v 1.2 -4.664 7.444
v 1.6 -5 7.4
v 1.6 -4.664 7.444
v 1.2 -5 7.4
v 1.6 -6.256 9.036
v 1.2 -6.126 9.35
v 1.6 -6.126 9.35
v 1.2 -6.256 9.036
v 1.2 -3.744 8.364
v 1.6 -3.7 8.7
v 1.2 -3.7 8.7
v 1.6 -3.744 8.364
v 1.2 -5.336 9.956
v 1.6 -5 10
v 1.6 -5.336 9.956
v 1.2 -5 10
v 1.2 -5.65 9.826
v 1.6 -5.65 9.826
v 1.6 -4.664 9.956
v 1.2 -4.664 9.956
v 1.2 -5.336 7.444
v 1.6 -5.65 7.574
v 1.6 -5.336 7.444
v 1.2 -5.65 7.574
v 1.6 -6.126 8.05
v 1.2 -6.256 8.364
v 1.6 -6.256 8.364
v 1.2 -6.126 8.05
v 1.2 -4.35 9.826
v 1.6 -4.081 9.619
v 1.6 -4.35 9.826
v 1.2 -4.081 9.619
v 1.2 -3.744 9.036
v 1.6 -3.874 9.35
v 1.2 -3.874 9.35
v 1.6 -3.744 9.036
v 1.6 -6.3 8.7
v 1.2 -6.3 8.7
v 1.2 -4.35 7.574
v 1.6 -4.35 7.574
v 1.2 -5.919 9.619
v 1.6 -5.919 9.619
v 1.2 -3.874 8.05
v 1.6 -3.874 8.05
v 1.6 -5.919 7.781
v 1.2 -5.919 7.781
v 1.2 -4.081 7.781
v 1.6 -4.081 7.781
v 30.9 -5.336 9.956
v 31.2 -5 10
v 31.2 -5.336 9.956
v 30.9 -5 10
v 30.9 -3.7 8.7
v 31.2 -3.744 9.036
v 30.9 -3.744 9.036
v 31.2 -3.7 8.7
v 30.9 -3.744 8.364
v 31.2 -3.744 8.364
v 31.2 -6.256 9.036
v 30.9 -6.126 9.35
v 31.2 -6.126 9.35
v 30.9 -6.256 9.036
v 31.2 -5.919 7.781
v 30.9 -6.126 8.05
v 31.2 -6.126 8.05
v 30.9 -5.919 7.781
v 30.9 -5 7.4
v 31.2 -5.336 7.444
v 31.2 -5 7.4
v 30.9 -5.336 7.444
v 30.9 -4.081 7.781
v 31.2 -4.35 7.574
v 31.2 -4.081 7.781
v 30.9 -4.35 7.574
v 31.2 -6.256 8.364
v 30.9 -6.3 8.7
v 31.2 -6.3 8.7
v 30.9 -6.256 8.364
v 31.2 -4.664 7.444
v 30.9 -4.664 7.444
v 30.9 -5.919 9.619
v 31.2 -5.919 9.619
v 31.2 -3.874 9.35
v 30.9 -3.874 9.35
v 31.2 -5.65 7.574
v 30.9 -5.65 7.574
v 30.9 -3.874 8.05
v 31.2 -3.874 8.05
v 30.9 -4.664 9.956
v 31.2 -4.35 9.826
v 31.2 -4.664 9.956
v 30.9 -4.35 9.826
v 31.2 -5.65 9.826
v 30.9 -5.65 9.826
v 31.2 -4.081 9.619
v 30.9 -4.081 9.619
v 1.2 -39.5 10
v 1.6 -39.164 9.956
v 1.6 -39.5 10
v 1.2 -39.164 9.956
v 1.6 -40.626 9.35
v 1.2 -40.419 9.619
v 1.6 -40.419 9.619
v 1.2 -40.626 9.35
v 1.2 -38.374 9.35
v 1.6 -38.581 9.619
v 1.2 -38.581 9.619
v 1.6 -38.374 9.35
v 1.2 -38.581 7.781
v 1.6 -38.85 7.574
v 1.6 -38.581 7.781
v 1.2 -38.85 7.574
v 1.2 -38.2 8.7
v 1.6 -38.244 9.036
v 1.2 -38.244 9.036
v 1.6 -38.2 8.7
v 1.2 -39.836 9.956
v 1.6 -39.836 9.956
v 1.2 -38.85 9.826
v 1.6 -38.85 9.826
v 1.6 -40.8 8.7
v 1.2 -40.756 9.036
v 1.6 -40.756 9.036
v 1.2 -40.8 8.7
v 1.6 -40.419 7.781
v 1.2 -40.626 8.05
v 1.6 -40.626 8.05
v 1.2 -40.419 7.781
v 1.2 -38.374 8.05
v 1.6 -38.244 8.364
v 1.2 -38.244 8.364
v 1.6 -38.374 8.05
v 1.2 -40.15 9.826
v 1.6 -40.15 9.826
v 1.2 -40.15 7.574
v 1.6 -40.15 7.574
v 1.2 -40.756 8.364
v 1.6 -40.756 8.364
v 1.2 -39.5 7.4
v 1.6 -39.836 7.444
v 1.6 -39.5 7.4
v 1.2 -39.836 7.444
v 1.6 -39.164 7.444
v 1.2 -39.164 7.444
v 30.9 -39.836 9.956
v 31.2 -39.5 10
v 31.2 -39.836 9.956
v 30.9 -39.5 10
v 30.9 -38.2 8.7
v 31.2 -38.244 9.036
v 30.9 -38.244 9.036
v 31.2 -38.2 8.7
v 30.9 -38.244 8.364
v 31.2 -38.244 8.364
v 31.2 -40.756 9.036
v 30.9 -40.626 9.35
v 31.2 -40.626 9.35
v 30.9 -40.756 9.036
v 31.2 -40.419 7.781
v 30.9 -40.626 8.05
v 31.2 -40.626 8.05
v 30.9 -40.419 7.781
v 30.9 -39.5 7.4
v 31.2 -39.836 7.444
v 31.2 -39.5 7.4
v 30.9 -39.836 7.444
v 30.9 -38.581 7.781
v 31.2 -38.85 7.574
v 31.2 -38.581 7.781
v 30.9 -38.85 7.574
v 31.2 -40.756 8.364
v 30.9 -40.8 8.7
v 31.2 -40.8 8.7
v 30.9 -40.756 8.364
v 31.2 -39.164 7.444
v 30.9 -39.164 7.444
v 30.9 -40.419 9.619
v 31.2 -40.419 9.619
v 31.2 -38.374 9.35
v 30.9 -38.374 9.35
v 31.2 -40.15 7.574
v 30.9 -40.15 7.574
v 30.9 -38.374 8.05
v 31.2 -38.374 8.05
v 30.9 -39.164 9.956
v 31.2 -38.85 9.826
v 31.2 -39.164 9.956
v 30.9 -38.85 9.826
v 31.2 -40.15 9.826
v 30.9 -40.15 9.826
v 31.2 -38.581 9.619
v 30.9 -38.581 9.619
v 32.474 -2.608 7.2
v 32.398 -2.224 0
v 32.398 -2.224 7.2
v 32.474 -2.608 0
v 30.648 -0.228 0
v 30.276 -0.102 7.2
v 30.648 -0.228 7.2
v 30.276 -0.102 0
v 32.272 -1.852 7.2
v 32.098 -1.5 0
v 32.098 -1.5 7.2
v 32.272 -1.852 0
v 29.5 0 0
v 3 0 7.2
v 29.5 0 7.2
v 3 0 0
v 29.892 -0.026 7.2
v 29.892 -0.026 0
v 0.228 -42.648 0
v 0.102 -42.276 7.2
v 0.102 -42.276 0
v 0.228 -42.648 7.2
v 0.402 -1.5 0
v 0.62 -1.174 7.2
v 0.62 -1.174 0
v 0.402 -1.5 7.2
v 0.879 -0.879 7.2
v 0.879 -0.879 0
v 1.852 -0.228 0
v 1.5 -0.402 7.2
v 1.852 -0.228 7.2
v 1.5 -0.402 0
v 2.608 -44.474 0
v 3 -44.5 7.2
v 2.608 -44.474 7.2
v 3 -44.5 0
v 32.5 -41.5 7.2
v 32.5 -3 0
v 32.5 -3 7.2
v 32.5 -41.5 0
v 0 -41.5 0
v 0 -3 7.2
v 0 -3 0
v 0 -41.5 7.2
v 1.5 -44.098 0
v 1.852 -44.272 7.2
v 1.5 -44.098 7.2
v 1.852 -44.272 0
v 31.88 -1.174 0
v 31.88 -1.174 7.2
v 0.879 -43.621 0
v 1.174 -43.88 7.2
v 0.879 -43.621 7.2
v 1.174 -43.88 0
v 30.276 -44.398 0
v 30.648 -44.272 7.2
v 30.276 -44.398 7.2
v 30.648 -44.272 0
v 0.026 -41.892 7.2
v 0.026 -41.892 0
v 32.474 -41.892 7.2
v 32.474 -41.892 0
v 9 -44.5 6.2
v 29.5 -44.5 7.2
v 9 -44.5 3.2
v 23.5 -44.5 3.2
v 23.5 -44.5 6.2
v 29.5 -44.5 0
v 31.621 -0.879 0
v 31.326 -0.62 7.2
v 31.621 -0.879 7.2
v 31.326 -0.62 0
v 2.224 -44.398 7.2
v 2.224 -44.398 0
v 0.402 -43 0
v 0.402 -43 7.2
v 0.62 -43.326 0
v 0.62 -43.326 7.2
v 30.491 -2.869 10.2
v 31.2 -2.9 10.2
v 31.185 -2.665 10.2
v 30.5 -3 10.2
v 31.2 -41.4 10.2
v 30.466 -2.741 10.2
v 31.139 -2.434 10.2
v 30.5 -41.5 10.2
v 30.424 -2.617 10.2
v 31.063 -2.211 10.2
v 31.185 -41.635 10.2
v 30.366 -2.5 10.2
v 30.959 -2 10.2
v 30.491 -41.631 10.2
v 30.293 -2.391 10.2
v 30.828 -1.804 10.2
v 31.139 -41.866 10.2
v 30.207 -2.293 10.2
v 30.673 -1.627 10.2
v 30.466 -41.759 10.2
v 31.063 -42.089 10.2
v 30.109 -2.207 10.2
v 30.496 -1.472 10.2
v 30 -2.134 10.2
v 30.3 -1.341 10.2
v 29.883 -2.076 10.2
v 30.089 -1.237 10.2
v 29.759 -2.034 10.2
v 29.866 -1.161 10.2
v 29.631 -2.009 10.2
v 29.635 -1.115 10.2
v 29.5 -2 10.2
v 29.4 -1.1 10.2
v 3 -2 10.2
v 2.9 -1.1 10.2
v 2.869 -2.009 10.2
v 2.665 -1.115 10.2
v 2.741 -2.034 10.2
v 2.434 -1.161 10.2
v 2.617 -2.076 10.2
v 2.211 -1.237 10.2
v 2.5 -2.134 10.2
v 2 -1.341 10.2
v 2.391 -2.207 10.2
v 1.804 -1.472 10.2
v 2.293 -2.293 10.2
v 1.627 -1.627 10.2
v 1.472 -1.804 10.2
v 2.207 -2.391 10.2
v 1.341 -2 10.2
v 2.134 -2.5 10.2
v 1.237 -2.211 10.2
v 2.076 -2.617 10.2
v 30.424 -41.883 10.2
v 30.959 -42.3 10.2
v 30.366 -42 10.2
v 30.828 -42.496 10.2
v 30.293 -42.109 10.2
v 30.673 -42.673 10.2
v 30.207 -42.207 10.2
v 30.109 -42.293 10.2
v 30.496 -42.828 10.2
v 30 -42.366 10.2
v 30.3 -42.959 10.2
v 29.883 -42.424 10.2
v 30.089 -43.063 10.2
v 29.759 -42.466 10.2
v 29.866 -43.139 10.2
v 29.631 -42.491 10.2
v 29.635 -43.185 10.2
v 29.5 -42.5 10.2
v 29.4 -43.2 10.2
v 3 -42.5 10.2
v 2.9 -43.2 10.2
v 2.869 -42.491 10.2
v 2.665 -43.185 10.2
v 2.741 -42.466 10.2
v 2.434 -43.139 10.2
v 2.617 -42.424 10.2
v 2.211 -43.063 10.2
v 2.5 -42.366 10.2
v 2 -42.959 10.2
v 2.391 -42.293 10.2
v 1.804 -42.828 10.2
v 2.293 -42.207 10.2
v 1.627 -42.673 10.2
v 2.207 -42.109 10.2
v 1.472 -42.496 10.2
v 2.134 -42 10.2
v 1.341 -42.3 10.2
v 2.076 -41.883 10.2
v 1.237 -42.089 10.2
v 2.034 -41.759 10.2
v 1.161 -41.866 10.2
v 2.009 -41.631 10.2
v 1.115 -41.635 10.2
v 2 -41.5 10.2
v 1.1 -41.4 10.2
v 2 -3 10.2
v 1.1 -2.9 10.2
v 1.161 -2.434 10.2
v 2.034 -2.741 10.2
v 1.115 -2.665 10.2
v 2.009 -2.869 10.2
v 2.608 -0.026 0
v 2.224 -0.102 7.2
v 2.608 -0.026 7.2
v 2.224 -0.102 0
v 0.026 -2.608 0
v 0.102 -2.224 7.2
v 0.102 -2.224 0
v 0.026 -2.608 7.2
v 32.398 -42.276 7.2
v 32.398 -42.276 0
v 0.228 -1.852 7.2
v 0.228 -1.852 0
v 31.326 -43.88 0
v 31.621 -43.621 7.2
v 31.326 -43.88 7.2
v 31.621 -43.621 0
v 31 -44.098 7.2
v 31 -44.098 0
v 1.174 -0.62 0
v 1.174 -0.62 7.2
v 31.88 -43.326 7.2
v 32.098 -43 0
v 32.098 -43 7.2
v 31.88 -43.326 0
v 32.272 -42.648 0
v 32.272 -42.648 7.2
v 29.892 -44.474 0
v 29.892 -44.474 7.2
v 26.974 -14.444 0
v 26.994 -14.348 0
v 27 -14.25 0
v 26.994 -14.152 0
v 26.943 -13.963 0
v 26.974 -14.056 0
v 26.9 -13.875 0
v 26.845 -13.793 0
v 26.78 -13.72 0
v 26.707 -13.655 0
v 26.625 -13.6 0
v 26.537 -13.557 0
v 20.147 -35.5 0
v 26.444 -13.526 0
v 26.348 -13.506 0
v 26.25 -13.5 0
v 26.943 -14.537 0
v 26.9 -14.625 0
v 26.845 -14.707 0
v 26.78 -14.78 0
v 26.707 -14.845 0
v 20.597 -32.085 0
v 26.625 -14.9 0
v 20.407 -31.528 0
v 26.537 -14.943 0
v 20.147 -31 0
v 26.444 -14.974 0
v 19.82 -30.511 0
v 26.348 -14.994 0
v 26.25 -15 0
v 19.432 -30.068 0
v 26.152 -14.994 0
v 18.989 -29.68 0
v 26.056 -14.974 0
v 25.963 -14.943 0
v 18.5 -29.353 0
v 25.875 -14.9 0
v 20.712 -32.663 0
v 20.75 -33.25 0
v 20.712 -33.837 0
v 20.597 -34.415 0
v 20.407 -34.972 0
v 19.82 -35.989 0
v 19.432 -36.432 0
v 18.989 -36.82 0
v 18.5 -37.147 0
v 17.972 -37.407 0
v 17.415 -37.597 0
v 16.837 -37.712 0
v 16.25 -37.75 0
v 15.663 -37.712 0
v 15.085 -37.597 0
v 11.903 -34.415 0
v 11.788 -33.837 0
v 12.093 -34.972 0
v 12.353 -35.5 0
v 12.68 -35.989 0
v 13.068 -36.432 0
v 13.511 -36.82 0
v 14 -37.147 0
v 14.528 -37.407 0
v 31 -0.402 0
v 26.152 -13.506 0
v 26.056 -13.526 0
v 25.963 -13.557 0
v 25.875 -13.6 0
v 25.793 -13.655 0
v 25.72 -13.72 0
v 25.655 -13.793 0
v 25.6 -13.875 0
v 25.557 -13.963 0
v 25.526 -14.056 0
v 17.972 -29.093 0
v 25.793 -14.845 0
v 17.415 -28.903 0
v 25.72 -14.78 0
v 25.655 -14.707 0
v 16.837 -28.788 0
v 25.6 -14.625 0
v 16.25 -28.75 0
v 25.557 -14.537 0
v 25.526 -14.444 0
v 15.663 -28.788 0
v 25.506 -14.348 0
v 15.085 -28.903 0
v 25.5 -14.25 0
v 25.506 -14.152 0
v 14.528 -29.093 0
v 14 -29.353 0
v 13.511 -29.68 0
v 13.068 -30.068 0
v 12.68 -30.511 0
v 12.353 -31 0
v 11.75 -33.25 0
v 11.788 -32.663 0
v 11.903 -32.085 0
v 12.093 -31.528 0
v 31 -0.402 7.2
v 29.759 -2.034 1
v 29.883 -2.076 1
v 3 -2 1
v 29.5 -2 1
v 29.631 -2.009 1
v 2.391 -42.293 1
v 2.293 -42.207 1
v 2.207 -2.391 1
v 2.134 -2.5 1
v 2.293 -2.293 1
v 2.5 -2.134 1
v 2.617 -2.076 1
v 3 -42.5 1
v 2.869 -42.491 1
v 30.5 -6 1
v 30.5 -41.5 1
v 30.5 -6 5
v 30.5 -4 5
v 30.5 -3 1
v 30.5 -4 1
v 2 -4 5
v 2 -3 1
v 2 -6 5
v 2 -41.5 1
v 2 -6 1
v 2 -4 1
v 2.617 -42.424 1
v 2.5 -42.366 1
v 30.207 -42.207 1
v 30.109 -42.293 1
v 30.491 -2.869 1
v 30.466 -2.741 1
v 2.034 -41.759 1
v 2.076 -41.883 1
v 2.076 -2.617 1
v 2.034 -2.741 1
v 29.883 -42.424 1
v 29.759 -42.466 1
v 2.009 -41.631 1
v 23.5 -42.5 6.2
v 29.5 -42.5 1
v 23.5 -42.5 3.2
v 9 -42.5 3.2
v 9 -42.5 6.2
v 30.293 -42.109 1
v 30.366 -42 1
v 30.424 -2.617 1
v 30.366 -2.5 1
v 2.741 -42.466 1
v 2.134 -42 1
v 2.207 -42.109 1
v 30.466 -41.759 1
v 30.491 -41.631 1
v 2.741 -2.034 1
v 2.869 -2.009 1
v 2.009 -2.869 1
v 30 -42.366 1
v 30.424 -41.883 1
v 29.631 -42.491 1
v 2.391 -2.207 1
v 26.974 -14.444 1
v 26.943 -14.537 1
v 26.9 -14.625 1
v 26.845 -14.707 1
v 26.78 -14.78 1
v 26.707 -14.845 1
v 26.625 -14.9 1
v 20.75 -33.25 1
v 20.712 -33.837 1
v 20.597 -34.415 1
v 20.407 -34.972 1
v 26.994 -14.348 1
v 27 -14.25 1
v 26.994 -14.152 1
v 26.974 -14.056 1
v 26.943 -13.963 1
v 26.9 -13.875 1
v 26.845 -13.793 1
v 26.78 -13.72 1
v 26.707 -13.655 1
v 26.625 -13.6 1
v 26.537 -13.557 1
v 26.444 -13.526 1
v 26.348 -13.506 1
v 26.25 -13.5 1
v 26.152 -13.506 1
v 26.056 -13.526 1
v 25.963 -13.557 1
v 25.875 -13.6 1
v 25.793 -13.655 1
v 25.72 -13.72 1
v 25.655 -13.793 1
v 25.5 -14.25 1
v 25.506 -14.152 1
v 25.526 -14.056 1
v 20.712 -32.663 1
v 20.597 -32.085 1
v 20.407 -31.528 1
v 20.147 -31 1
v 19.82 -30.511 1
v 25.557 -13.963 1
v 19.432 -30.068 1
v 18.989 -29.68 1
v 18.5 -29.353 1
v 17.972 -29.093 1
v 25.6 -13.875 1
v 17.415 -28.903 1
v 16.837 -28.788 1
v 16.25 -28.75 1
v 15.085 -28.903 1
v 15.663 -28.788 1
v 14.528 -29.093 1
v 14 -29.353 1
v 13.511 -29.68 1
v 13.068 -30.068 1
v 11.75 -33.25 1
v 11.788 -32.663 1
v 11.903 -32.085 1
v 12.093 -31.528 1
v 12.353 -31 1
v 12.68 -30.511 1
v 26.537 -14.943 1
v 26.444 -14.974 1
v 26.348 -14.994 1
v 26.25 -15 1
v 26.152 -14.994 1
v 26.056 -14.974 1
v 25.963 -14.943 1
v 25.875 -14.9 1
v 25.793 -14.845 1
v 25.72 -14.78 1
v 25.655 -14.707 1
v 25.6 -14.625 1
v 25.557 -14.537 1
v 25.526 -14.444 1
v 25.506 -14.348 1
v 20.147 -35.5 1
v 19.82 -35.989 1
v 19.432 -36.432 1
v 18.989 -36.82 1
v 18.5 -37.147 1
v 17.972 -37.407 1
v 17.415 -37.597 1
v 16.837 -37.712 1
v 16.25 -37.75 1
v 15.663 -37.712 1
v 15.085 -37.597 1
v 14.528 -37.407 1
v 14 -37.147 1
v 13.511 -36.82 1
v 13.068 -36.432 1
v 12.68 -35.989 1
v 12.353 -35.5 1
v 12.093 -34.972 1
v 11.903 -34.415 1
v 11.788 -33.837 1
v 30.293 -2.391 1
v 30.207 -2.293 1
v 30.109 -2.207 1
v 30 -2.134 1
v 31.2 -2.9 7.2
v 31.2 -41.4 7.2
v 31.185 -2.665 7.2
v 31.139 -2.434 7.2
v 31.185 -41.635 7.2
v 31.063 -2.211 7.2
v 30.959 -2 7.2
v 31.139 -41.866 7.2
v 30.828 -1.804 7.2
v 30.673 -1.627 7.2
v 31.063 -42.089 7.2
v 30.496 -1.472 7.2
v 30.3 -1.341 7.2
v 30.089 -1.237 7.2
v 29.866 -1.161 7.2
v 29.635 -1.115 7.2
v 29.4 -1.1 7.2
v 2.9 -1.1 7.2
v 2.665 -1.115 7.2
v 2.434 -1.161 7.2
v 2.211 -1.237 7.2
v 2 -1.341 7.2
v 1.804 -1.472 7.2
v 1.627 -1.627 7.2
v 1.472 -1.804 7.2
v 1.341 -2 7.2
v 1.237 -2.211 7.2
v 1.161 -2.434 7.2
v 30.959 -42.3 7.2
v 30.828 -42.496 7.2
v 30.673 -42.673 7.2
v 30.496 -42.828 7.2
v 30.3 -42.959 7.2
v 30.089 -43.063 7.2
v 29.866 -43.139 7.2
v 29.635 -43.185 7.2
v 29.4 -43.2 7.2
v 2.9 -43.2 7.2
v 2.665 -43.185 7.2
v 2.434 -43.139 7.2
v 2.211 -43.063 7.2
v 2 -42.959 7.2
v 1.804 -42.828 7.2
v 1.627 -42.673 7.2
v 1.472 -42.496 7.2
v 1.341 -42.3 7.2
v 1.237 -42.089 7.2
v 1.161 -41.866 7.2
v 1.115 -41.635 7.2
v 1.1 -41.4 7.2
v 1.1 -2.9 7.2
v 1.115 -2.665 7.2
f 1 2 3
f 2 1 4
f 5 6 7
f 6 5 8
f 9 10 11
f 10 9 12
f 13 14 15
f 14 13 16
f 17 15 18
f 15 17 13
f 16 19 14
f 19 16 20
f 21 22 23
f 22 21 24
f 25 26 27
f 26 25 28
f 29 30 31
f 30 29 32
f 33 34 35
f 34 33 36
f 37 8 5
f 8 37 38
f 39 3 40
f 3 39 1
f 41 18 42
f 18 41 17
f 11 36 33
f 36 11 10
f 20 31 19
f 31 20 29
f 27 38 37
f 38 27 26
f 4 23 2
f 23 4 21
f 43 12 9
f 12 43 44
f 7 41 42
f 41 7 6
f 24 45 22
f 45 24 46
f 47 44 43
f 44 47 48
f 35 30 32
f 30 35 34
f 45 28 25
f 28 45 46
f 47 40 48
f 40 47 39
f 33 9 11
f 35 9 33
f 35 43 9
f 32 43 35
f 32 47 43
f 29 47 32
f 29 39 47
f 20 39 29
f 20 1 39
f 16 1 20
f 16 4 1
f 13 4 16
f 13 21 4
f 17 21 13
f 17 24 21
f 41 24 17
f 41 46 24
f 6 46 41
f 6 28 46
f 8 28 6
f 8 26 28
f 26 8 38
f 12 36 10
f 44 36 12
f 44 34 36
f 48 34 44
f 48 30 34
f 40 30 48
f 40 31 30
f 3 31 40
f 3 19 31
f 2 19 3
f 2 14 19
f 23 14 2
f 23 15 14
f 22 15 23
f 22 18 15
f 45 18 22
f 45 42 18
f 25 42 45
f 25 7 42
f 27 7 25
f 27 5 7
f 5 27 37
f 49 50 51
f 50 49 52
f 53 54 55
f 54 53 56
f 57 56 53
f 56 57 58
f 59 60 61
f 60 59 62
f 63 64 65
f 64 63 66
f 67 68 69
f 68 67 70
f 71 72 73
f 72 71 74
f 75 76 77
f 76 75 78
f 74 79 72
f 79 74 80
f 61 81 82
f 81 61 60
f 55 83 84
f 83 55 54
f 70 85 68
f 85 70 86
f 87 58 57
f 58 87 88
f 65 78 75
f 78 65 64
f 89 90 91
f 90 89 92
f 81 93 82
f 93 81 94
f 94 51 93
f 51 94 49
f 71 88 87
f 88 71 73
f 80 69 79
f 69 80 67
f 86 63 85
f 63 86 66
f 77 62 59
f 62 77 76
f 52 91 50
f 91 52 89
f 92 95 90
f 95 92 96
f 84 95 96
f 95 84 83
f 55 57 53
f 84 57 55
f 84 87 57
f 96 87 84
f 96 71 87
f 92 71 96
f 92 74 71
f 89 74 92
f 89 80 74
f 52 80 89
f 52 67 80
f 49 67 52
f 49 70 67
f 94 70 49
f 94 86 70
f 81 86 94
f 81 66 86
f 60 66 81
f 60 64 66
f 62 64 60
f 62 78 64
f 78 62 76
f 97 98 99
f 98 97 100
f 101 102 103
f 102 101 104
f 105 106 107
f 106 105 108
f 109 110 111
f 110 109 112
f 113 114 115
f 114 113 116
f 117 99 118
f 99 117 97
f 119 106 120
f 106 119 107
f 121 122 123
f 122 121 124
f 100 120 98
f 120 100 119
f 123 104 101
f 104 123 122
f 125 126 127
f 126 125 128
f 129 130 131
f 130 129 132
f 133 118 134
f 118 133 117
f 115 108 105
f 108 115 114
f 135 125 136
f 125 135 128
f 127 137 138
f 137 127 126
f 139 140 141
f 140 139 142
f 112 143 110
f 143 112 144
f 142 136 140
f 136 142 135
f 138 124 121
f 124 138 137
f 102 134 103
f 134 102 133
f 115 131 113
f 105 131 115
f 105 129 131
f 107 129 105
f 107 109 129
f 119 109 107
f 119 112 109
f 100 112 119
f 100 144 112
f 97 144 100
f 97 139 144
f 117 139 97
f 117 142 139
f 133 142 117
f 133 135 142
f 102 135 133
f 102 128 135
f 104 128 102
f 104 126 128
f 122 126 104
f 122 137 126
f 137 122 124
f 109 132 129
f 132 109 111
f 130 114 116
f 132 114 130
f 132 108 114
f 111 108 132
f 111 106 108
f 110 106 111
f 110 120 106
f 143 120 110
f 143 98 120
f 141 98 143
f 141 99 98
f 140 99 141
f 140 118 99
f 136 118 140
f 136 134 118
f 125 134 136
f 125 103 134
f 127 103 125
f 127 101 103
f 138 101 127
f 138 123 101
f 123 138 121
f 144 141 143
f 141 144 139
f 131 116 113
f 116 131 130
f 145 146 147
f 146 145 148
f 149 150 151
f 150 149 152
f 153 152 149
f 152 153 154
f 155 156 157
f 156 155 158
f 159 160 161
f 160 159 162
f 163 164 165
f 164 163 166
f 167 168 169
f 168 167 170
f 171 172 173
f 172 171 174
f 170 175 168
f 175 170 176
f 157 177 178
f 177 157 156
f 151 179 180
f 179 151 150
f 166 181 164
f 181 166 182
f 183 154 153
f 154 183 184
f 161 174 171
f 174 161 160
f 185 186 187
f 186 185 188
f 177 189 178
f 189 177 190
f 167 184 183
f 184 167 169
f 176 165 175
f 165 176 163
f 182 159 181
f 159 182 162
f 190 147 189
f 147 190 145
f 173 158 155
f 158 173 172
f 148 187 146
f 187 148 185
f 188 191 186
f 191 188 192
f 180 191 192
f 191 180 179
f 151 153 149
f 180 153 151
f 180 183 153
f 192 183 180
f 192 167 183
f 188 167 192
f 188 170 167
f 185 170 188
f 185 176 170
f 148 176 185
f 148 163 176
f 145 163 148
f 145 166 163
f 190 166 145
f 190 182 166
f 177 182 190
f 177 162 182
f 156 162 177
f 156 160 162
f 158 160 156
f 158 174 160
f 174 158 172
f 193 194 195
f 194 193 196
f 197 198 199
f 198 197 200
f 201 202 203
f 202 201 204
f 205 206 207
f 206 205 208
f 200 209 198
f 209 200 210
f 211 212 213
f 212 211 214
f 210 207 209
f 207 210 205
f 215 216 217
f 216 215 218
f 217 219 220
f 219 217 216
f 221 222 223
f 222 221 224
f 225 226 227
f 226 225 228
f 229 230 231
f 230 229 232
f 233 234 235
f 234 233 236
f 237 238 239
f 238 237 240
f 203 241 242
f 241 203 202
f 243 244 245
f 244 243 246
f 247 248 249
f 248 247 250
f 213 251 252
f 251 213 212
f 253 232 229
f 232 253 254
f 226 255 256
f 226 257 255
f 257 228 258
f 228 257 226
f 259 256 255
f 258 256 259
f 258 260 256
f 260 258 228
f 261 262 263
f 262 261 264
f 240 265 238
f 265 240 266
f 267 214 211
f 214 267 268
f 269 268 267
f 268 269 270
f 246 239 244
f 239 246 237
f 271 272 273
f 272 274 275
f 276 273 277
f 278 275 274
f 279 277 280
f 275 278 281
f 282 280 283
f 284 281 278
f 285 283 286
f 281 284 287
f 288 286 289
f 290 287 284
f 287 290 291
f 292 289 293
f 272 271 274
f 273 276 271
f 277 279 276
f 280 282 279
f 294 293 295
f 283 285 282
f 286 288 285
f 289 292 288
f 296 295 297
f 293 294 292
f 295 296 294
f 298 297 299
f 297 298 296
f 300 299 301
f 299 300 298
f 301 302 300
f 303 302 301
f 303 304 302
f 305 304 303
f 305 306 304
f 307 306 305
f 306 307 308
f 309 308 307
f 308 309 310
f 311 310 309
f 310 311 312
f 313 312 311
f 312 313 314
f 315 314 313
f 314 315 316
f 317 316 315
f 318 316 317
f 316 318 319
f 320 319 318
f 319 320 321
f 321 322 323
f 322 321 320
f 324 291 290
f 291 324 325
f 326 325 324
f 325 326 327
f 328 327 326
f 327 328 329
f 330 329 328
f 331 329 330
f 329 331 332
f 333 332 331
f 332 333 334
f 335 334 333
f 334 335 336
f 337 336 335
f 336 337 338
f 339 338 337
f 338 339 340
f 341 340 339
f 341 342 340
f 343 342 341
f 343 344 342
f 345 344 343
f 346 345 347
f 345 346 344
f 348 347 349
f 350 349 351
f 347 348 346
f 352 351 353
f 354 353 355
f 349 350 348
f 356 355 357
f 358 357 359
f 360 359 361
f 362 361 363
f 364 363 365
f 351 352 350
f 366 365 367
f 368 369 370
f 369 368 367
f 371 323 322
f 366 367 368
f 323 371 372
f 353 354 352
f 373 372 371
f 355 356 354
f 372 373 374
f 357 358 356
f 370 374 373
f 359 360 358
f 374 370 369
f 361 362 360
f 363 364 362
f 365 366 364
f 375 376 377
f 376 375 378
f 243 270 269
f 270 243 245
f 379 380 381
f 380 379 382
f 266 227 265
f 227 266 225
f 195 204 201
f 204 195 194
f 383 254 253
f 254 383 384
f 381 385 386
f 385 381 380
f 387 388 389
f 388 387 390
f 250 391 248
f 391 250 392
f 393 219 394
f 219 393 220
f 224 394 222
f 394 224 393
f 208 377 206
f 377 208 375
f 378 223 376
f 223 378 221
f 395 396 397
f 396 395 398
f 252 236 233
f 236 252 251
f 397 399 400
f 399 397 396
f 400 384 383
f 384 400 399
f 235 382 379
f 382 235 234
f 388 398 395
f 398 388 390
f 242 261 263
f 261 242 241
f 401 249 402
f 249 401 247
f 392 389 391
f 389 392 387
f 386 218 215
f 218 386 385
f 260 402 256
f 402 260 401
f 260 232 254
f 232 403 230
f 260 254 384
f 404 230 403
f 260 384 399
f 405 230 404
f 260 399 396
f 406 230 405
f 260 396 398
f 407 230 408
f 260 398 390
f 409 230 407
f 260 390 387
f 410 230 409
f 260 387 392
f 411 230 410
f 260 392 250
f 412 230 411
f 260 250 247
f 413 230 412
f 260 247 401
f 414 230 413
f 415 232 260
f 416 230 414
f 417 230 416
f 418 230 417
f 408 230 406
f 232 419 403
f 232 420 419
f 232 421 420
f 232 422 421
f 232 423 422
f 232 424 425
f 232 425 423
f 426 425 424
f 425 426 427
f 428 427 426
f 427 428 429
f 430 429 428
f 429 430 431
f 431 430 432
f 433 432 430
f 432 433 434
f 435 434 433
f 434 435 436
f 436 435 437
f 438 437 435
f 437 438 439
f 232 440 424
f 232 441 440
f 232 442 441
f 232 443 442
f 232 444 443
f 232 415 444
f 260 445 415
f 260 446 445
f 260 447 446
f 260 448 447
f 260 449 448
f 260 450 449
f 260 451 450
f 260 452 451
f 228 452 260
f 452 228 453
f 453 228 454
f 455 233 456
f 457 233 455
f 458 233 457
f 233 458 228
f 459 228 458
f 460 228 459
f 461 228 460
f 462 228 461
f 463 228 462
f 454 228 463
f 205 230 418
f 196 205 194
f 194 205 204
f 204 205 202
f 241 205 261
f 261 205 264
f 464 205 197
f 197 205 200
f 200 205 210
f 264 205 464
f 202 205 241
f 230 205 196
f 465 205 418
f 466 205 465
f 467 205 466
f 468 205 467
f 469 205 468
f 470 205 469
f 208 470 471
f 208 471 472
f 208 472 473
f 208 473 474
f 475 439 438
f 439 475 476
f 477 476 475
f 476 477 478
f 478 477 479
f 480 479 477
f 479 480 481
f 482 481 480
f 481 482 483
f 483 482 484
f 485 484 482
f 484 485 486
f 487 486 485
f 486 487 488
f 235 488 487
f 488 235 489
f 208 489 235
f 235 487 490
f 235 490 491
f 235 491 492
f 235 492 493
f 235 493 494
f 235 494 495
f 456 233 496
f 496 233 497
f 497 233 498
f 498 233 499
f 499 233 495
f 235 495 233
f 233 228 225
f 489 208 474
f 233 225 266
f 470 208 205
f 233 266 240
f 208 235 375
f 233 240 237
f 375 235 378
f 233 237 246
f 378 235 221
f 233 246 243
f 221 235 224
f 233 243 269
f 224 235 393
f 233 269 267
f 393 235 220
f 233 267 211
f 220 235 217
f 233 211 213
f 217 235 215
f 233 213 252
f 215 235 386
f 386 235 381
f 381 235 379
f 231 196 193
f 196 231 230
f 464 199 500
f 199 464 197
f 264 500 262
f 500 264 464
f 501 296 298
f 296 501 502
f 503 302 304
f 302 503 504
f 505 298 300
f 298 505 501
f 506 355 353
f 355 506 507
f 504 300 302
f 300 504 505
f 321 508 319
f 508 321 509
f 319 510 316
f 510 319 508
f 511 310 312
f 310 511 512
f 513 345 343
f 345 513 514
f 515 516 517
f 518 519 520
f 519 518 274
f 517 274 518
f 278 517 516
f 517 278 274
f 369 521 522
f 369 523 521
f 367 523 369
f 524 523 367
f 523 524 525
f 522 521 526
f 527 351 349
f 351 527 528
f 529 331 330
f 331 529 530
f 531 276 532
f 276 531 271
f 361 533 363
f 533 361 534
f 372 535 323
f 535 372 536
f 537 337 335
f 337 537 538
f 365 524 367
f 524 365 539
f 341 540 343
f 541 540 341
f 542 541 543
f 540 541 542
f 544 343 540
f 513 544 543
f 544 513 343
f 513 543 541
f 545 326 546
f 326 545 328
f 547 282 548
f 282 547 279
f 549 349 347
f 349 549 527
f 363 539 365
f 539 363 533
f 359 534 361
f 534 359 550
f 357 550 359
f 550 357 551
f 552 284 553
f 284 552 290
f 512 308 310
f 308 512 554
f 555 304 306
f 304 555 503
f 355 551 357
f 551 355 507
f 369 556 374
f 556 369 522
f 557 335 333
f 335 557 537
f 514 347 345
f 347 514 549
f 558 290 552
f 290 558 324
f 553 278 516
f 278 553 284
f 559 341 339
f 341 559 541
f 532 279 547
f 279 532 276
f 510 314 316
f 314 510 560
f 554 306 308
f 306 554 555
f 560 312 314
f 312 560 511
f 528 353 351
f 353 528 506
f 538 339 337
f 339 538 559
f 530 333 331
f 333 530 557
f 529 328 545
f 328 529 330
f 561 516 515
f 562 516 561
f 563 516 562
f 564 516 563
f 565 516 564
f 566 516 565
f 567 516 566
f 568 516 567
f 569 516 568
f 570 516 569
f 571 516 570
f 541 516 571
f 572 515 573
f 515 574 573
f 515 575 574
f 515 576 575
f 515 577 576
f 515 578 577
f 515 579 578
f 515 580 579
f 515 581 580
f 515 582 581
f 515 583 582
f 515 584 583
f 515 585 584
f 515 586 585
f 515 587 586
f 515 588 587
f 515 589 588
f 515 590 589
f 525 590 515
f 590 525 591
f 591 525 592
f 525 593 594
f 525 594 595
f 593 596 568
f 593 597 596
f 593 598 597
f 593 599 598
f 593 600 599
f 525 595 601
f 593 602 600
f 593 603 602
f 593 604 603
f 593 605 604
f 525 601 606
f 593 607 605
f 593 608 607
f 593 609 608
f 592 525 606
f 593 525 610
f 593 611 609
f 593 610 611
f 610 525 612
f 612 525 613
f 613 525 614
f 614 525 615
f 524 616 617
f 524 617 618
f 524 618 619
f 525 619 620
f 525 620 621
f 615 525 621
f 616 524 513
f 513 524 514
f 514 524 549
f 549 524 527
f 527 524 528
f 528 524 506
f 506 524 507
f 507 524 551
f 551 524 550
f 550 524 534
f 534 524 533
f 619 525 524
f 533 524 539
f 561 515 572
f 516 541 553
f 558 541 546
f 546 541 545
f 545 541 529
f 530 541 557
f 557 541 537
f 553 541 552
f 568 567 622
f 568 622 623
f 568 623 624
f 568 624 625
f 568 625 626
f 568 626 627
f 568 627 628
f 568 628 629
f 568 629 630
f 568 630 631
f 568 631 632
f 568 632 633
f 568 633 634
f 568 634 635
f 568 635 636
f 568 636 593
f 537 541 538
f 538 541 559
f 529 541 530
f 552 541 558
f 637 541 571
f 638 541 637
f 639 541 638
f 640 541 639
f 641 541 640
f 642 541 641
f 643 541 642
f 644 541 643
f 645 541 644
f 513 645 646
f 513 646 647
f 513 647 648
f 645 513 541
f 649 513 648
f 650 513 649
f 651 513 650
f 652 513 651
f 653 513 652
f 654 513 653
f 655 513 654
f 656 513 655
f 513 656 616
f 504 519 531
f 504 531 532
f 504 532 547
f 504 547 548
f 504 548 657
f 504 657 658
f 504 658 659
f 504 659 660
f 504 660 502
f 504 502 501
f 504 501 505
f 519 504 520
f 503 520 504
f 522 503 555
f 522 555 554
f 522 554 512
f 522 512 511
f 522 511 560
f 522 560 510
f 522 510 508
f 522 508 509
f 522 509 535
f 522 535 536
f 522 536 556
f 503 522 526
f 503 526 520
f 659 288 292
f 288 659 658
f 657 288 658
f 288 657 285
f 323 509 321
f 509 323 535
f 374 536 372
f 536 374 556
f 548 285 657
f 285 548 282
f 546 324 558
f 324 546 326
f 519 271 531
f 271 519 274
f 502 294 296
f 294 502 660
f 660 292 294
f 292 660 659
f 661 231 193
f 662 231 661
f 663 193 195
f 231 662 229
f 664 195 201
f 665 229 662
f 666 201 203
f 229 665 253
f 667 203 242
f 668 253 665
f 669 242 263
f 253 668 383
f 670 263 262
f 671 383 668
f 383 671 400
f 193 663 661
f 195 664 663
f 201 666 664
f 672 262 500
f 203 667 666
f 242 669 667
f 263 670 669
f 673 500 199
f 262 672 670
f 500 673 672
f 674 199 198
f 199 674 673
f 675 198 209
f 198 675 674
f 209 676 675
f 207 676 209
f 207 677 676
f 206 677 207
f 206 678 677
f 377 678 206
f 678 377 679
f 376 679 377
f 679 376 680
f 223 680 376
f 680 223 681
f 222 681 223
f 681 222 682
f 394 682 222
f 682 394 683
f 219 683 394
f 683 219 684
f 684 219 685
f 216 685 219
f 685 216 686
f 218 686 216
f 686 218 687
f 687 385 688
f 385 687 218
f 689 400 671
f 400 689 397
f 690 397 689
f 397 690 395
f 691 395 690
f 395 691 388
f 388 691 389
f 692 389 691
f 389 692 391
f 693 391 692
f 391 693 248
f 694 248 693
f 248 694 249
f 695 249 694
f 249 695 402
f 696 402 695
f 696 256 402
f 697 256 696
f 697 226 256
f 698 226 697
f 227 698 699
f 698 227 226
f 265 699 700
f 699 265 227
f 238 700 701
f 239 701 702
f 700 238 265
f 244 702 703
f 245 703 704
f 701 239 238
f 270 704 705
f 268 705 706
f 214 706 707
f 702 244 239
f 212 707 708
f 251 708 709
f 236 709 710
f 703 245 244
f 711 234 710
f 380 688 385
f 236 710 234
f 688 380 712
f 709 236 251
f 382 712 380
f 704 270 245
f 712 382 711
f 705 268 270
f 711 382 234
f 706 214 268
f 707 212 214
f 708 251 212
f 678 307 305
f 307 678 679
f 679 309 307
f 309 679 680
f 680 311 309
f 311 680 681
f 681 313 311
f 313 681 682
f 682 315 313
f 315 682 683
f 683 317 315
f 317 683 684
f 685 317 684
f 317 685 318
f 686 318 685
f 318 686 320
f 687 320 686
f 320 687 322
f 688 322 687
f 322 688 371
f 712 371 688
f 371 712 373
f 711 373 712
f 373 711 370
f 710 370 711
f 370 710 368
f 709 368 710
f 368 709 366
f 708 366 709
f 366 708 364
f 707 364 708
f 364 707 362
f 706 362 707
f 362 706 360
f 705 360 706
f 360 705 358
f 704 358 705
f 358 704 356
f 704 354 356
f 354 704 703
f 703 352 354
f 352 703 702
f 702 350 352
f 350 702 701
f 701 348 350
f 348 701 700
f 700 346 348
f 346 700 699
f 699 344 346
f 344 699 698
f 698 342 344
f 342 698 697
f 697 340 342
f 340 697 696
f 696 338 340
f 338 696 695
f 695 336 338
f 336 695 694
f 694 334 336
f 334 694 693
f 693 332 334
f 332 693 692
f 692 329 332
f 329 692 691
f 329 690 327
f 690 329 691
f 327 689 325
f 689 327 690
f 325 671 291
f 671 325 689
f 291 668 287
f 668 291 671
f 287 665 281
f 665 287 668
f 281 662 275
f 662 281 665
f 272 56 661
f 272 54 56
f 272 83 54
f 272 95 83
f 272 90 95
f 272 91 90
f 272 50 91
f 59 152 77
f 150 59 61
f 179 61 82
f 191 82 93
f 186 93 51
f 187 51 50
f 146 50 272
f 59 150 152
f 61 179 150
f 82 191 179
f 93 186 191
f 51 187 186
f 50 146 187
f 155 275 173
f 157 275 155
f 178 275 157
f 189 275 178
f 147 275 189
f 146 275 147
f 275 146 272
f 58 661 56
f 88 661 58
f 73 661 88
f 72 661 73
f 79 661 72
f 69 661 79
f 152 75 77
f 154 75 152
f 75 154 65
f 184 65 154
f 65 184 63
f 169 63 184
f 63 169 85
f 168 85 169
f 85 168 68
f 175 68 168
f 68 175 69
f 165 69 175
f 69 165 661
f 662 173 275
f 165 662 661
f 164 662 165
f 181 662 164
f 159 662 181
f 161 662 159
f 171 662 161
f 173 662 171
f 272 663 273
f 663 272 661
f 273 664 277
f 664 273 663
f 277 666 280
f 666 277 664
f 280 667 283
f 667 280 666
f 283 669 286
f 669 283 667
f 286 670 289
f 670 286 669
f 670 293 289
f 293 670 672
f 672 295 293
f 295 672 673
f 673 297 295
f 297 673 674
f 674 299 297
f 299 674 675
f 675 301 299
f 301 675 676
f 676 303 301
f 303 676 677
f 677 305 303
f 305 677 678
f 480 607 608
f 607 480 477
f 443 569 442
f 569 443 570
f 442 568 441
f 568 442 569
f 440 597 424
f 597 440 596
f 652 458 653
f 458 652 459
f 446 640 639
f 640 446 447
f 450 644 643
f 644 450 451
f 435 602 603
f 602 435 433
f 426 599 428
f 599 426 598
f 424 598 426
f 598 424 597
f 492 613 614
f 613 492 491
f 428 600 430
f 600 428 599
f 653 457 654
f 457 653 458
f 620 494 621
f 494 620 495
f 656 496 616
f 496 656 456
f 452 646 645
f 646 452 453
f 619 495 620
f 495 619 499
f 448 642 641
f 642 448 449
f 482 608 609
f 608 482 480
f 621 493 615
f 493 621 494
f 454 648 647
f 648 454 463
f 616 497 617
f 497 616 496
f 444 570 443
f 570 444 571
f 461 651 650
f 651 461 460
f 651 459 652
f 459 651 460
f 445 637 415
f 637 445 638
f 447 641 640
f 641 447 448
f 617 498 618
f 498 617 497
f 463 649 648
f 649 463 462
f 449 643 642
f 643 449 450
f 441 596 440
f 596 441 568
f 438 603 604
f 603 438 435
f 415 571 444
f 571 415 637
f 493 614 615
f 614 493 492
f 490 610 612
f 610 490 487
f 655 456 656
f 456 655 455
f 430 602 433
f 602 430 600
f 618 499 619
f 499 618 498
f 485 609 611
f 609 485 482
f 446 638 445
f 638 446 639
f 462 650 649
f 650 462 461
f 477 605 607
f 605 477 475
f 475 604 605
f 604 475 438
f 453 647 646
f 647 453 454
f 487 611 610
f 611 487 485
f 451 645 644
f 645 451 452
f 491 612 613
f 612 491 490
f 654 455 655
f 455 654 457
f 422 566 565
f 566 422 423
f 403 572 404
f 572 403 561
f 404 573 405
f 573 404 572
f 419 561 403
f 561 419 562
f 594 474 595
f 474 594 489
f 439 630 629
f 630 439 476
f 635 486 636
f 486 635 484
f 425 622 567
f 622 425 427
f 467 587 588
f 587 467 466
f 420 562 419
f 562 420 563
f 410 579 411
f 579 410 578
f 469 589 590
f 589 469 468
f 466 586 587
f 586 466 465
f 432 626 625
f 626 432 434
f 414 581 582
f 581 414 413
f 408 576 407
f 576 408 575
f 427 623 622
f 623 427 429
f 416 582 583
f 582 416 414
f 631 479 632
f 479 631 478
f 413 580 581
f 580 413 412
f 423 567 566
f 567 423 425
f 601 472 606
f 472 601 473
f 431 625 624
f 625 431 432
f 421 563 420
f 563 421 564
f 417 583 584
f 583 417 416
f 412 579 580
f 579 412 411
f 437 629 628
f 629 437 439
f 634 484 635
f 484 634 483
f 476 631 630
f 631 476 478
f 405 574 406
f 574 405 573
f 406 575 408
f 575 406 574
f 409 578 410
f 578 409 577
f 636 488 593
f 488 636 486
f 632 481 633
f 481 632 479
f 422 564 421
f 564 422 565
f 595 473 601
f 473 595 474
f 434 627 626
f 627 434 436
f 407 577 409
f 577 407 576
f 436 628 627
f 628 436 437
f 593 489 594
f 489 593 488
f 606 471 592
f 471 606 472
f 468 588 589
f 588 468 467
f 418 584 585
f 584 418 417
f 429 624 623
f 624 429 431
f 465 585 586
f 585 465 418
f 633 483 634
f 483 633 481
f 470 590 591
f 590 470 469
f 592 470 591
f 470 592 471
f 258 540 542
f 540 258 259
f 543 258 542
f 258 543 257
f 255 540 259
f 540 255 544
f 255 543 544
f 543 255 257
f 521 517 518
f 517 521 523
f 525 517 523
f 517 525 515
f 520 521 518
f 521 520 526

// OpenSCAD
// ============================================================
// ESP32-CAM Dev Case  —  FORIOT ESP32-CAM + MB V1541
// Measurements confirmed 2026-04-27
// ============================================================
//
// BOARD LAYOUT:
//   Both boards are 28x40mm and stack face-to-face via pin headers.
//   Case footprint: ~32.5 x 44.5mm.  Total height: ~22.0mm assembled.
//
// ORIENTATION IN CASE:
//   Camera end = "top" of case (Y = OUTER_L)
//   USB-C end  = "bottom" of case (Y = 0)
//   Board sits face-up; camera module faces up through the lid.
//
// CLOSURE — STEPPED WALL:
//   Tray: top STEP_H has inner pocket expanded by WALL_STEP (outer ledge).
//   Lid:  bottom STEP_H has outer wall thinned by (WALL_STEP + STEP_FIT).
//   The thin lid skirt slides into the wider tray opening and sits on the ledge.
//   No protruding snap features — nothing to break.
//
// PRINT:
//   Tray — open top up, no supports needed
//   Lid  — open rim down (outer camera face pointing up), no supports needed.
//          The 8x8mm camera pocket bridges cleanly at this size.
//
// EXPORT:
//   Set SHOW = "tray" or "lid", then Render (F6) → Export STL.

SHOW = "lid"; // "tray" | "lid" | "preview"
$fn = 48;


// ============================================================
// MEASUREMENTS  (all from caliper, 2026-04-27)
// ============================================================

PCB_W   = 28.0;  // Both boards: width
PCB_L   = 40.0;  // Both boards: length  (same footprint, vertical stack)
STACK_H = 24.0;  // Full assembly height: MB board bottom → lens tip

// Compact OV2640 camera module
CAM_MOD_W     =  8.0;  // Module body width
CAM_MOD_L     =  8.0;  // Module body length
CAM_MOD_THICK =  8.0;  // Module thickness: PCB surface → lens tip
CAM_LENS_D    =  9.0;  // Lens barrel outer diameter

// Lens center — from ESP32-CAM PCB edges
CAM_LENS_FROM_CAM_END =  9.0;  // from camera-end short edge
CAM_LENS_FROM_LEFT    = 14.0;  // from left long edge (centered on 28mm board)

// LED (status LED, near non-camera end)
LED_D            =  1.5;  // small pinhole — just enough to pass light through
LED_FROM_CAM_END = 28.0;  // from camera-end short edge (= 12mm from USB-C end)
LED_FROM_LEFT    = 24.0;  // from left long edge (4mm from right edge)

// SD card slot — opens at camera-end short wall
SD_SLOT_W       = 14.0;  // opening width (along board width axis)
SD_SLOT_H       =  2.0;  // opening height

// MB board bottom edge — USB-C, IO0, RST
USBC_FROM_LEFT =  14.0;  // connector center from left long edge
USBC_W         =   8.0;  // connector body width

IO0_FROM_LEFT  =   2.0;  // button center from left long edge
RST_FROM_LEFT  =  26.0;  // button center from left long edge
BTN_HOLE_D     =   5.0;  // access hole diameter
BTN_Y          =   9.0;  // hole center from USB-C end (7mm measured + 2mm shift)


// ============================================================
// DESIGN PARAMETERS
// ============================================================

WALL     = 2.0;   // Wall thickness
FLOOR_T  = 1.0;   // Outer face / tray floor thickness
CORNER_R = 3.0;   // Outer corner radius
FIT      = 0.25;  // Clearance per side — board in pocket
RAIL_H   = 0.8;   // PCB support rail height (lifts board off tray floor)
RAIL_W   = 1.5;   // PCB support rail width

// Stepped wall closure
STEP_H       = 3.0;  // Overlap zone height at tray top / lid bottom
WALL_STEP    = 1.0;  // Tray inner pocket expands by this much in step zone
STEP_FIT     = 0.2;  // Clearance per side — lid step sliding into tray step
CAM_PROTRUDE = 0.8;  // How far the lens barrel extends above the case top face

// Tray height trim — reduces tray below PCB surface level, exposing more of the assembly
TRAY_H_TRIM  = 3.0;  // mm to subtract from hardware-aligned tray height

// Step-zone snap détentes (cylindrical bumps on tray / recesses in lid)
SNAP_R        = 1.2;  // bump radius
SNAP_PROTRUDE = 0.3;  // bump height from tray inner step-zone face
SNAP_Y_INSET  = 5.0;  // from each short wall to snap centre (clear of button holes)

// Ventilation
VENT_D   = 2.2;
VENT_GAP = 5.0;

// Estimated MB board PCB thickness (standard, not measured)
MB_PCB_T = 1.6;


// ============================================================
// DERIVED  — do not edit below this line
// ============================================================

TOTAL_L  = PCB_L;                          // Both boards same footprint
INNER_W  = PCB_W  + FIT * 2;              // 28.5
INNER_L  = TOTAL_L + FIT * 2;             // 40.5
OUTER_W  = INNER_W + WALL * 2;            // 32.5
OUTER_L  = INNER_L + WALL * 2;            // 44.5

// Height from MB board bottom to ESP32-CAM top (PCB surface)
PCB_SURFACE_H = STACK_H - CAM_MOD_THICK;  // 24 - 8 = 16mm

// Tray: TRAY_H_TRIM shortens the tray below the PCB surface, exposing that much
// of the board assembly above the tray rim (captured by the lid instead).
TRAY_H = FLOOR_T + RAIL_H + PCB_SURFACE_H - TRAY_H_TRIM; // 1.0 + 0.8 + 16 - 3.0 = 14.8mm

// Lid: sized so lens protrudes CAM_PROTRUDE above case face.
// Case top = (TRAY_H - STEP_H) + LID_H; lens tip = Z_MB_FLOOR + STACK_H
// → LID_H = CAM_MOD_THICK + STEP_H - CAM_PROTRUDE = 8 + 3 - 0.8 = 10.2mm
LID_H  = CAM_MOD_THICK + STEP_H - CAM_PROTRUDE; // 10.2mm

// Total assembled height = (TRAY_H - STEP_H) + LID_H = 11.8 + 10.2 = 22.0mm
// Camera protrudes TRAY_H_TRIM + CAM_PROTRUDE = 3.8mm above case face.

// Key Z positions in tray coordinates (Z=0 = tray outer bottom)
Z_MB_FLOOR   = FLOOR_T + RAIL_H;                    // MB board bottom = 1.8mm
Z_ESP32_TOP  = FLOOR_T + RAIL_H + PCB_SURFACE_H;    // ESP32 PCB top   = 17.8mm (above TRAY_H)
Z_BTN_CENTER = Z_MB_FLOOR + 3.0;                    // shifted down 5mm from previous = 4.8mm

// SD slot Z in lid coords: position is set by board assembly geometry, not by TRAY_H_TRIM.
// Reference uses the full hardware-aligned tray height (no trim) so the slot stays at the
// same place within the lid regardless of how much the tray has been shortened.
// = (Z_MB_FLOOR + 17) − ((FLOOR_T + RAIL_H + PCB_SURFACE_H) − STEP_H) = 18.8 − 14.8 = 4.0mm
SD_LID_Z_BOTTOM = (Z_MB_FLOOR + 17.0) - ((FLOOR_T + RAIL_H + PCB_SURFACE_H) - STEP_H);


// ============================================================
// UTILITIES
// ============================================================

module rounded_rect(w, l, r) {
    offset(r=r) offset(r=-r) square([w, l]);
}

// Solid shell, open at top
module rounded_shell(w, l, h, r) {
    difference() {
        linear_extrude(h) rounded_rect(w, l, r);
        translate([WALL, WALL, FLOOR_T])
            linear_extrude(h)
                rounded_rect(w - WALL*2, l - WALL*2, max(r - WALL, 0.5));
    }
}


// ============================================================
// TRAY
// ============================================================
// Coordinate origin: outer bottom-left corner.
// Y=0: USB-C / non-camera end.    Y=OUTER_L: camera end.
// Z=0: tray bottom.               Z=TRAY_H: open top.
//
// Stepped wall: a notch STEP_H tall is cut from the inner side of the top
// STEP_H of wall, expanding the opening by WALL_STEP on each side.
// This creates a ledge the lid's thin skirt rests on.

module tray() {
    difference() {
        rounded_shell(OUTER_W, OUTER_L, TRAY_H, CORNER_R);

        // -- Stepped wall: expand inner pocket for top STEP_H --
        translate([WALL - WALL_STEP, WALL - WALL_STEP, TRAY_H - STEP_H])
            linear_extrude(STEP_H + 0.1)
                rounded_rect(
                    INNER_W + WALL_STEP * 2,
                    INNER_L + WALL_STEP * 2,
                    max(CORNER_R - WALL + WALL_STEP, 0.5)
                );

        // -- USB-C slot (short wall at Y=0, 1mm raised floor, 9mm tall) --
        translate([
            WALL + FIT + USBC_FROM_LEFT - 12.0 / 2,
            -0.1,
            FLOOR_T + 1.0
        ])
            cube([12.0, WALL + 0.2, 9.0]);

        // -- IO0 access hole (LEFT long wall) --
        translate([-0.1, BTN_Y, Z_BTN_CENTER])
            rotate([0, 90, 0])
                cylinder(d=BTN_HOLE_D, h=WALL + FIT + IO0_FROM_LEFT + 0.5);

        // -- RST access hole (RIGHT long wall) --
        translate([OUTER_W + 0.1, BTN_Y, Z_BTN_CENTER])
            rotate([0, -90, 0])
                cylinder(d=BTN_HOLE_D, h=WALL + FIT + (PCB_W - RST_FROM_LEFT) + 0.5);

        // -- Button load channels: vertical slots above IO0/RST holes --
        // Allows board to slide straight down without pressing the buttons.
        btn_channels();

        // -- Ventilation holes (tray floor) --
        tray_vents();
    }

    // PCB support rails — lift boards off floor, clear bottom-side components
    pcb_rails();
    // Snap bumps in step zone — click into matching lid recesses
    tray_step_snaps();
}

module pcb_rails() {
    translate([WALL,                    WALL, FLOOR_T])
        cube([RAIL_W, INNER_L, RAIL_H]);
    translate([WALL + INNER_W - RAIL_W, WALL, FLOOR_T])
        cube([RAIL_W, INNER_L, RAIL_H]);
}

module tray_vents() {
    usable_w = INNER_W - RAIL_W * 2;
    cols = max(1, floor(usable_w / VENT_GAP));
    rows = max(1, floor(INNER_L   / VENT_GAP));
    x0 = WALL + RAIL_W + (usable_w - (cols-1) * VENT_GAP) / 2;
    y0 = WALL           + (INNER_L  - (rows-1) * VENT_GAP) / 2;
    for (r=[0:rows-1], c=[0:cols-1])
        translate([x0 + c*VENT_GAP, y0 + r*VENT_GAP, -0.1])
            cylinder(d=VENT_D, h=FLOOR_T + 0.2);
}

module btn_channels() {
    // Shallow groove on the inner face of each long wall, running from the
    // tray rim down to the button hole. Depth = WALL_STEP (same as the step
    // closure lip) so the button clears the wall as the board slides in.
    ch_h = TRAY_H - Z_BTN_CENTER + 0.1;  // from hole center to tray rim

    // Left wall — IO0: groove cut into inner face (X = WALL - WALL_STEP → WALL)
    translate([WALL - WALL_STEP, BTN_Y - BTN_HOLE_D / 2, Z_BTN_CENTER - 0.1])
        cube([WALL_STEP, BTN_HOLE_D, ch_h]);

    // Right wall — RST: groove cut into inner face (X = OUTER_W-WALL → OUTER_W-WALL+WALL_STEP)
    translate([OUTER_W - WALL, BTN_Y - BTN_HOLE_D / 2, Z_BTN_CENTER - 0.1])
        cube([WALL_STEP, BTN_HOLE_D, ch_h]);
}


module tray_step_snaps() {
    // Cylindrical bumps on the inner face of the tray step-zone walls (long sides).
    // Two per wall, inset from each short end, clear of the button-hole channels.
    // The bump protrudes into the step void and deflects the lid skirt 0.1mm on
    // the way past, then clicks into the matching recess when the lid is seated.
    snap_z = TRAY_H - STEP_H / 2;
    for (y = [SNAP_Y_INSET, OUTER_L - SNAP_Y_INSET]) {
        // Left wall — bump points +X into step void
        translate([WALL - WALL_STEP, y, snap_z])
            rotate([0, 90, 0])
                cylinder(r=SNAP_R, h=SNAP_PROTRUDE, $fn=24);
        // Right wall — bump points -X into step void
        translate([OUTER_W - WALL + WALL_STEP, y, snap_z])
            rotate([0, -90, 0])
                cylinder(r=SNAP_R, h=SNAP_PROTRUDE, $fn=24);
    }
}

module lid_rib() {
    // Retention rib: full inner width, 2mm deep, 3mm tall, 2mm from USB-C-end inner wall.
    face_z = LID_H - FLOOR_T;
    translate([WALL, WALL + 2.0, face_z - 4.0])
        cube([INNER_W, 2.0, 4.0]);
}

module lid_step_snap_recesses() {
    // Cylindrical recesses in the outer face of the lid step skirt.
    // Positioned to match tray bumps when the lid is fully seated.
    // snap_z in lid coords = STEP_H/2 (same middle-of-step formula as tray).
    step_cut  = WALL_STEP + STEP_FIT;   // 1.2mm — outer face of lid skirt
    snap_z    = STEP_H / 2;
    recess_r  = SNAP_R + 0.1;           // slight clearance
    recess_h  = SNAP_PROTRUDE + 0.1;    // slightly deeper than bump
    for (y = [SNAP_Y_INSET, OUTER_L - SNAP_Y_INSET]) {
        // Left skirt — recess enters from outer face in +X
        translate([step_cut, y, snap_z])
            rotate([0, 90, 0])
                cylinder(r=recess_r, h=recess_h, $fn=24);
        // Right skirt — recess enters from outer face in -X
        translate([OUTER_W - step_cut, y, snap_z])
            rotate([0, -90, 0])
                cylinder(r=recess_r, h=recess_h, $fn=24);
    }
}


// ============================================================
// LID
// ============================================================
// Z=0: open rim (sits on tray).    Z=LID_H: outer face (top).
// Stepped wall: outer (WALL_STEP + STEP_FIT) mm of wall is removed for the
// bottom STEP_H, leaving a thin inner skirt that slides into the tray step zone.
//
// PRINT ORIENTATION: rim down (Z=0 on build plate).

module lid() {
    face_z = LID_H - FLOOR_T;  // inner face height = 10.2 - 1.0 = 9.2mm

    difference() {
        linear_extrude(LID_H)
            rounded_rect(OUTER_W, OUTER_L, CORNER_R);

        // Hollow interior — open at rim (Z=0)
        translate([WALL, WALL, -0.1])
            linear_extrude(face_z + 0.1)
                rounded_rect(INNER_W, INNER_L, max(CORNER_R - WALL, 0.5));

        // Stepped wall — thin outer wall for bottom STEP_H
        lid_step_cut();

        // Camera lens hole — through outer face
        translate([
            WALL + FIT + CAM_LENS_FROM_LEFT,
            WALL + FIT + TOTAL_L - CAM_LENS_FROM_CAM_END,
            face_z - 0.1
        ])
            cylinder(d=CAM_LENS_D, h=FLOOR_T + 0.2);

        // Camera module pocket — into inner face, holds OV2640 flat
        translate([
            WALL + FIT + CAM_LENS_FROM_LEFT - CAM_MOD_W / 2 - 0.25,
            WALL + FIT + TOTAL_L - CAM_LENS_FROM_CAM_END - CAM_MOD_L / 2 - 0.25,
            face_z - CAM_MOD_THICK - 0.5
        ])
            cube([CAM_MOD_W + 0.5, CAM_MOD_L + 0.5, CAM_MOD_THICK + 0.5]);

        // LED hole — through outer face
        translate([
            WALL + FIT + LED_FROM_LEFT,
            WALL + FIT + TOTAL_L - LED_FROM_CAM_END,
            face_z - 0.1
        ])
            cylinder(d=LED_D, h=FLOOR_T + 0.2);

        // SD card slot — camera-end short wall (Y=OUTER_L), centered
        translate([
            OUTER_W / 2 - (SD_SLOT_W + 0.5) / 2,
            OUTER_L - WALL - 0.1,
            SD_LID_Z_BOTTOM
        ])
            cube([SD_SLOT_W + 0.5, WALL + 0.2, SD_SLOT_H + 1.0]);

        // Snap recesses in lid step skirt — match tray bumps
        lid_step_snap_recesses();
    }

    // Retention rib — 2mm from USB-C-end inner wall
    lid_rib();
}

module lid_step_cut() {
    // Remove outer (WALL_STEP + STEP_FIT) of wall for the bottom STEP_H.
    // Remaining inner-wall thickness in step zone = WALL - (WALL_STEP + STEP_FIT) = 0.8mm.
    step_cut = WALL_STEP + STEP_FIT;  // 1.2mm
    translate([-0.1, -0.1, -0.1])
        linear_extrude(STEP_H + 0.1)
            difference() {
                rounded_rect(OUTER_W + 0.2, OUTER_L + 0.2, CORNER_R);
                translate([step_cut, step_cut, 0])
                    rounded_rect(
                        OUTER_W - step_cut * 2,
                        OUTER_L - step_cut * 2,
                        max(CORNER_R - step_cut, 0.5)
                    );
            }
}


// ============================================================
// RENDER
// ============================================================

if (SHOW == "tray") {
    tray();

} else if (SHOW == "lid") {
    // Lid printed rim-down — shown here in print orientation
    translate([0, 0, LID_H]) rotate([180, 0, 0]) lid();

} else {
    // Preview: assembled. Lid drops STEP_H into tray opening.
    color("SteelBlue",   0.85) tray();
    color("YellowGreen", 0.85) translate([0, 0, TRAY_H - STEP_H]) lid();
}
